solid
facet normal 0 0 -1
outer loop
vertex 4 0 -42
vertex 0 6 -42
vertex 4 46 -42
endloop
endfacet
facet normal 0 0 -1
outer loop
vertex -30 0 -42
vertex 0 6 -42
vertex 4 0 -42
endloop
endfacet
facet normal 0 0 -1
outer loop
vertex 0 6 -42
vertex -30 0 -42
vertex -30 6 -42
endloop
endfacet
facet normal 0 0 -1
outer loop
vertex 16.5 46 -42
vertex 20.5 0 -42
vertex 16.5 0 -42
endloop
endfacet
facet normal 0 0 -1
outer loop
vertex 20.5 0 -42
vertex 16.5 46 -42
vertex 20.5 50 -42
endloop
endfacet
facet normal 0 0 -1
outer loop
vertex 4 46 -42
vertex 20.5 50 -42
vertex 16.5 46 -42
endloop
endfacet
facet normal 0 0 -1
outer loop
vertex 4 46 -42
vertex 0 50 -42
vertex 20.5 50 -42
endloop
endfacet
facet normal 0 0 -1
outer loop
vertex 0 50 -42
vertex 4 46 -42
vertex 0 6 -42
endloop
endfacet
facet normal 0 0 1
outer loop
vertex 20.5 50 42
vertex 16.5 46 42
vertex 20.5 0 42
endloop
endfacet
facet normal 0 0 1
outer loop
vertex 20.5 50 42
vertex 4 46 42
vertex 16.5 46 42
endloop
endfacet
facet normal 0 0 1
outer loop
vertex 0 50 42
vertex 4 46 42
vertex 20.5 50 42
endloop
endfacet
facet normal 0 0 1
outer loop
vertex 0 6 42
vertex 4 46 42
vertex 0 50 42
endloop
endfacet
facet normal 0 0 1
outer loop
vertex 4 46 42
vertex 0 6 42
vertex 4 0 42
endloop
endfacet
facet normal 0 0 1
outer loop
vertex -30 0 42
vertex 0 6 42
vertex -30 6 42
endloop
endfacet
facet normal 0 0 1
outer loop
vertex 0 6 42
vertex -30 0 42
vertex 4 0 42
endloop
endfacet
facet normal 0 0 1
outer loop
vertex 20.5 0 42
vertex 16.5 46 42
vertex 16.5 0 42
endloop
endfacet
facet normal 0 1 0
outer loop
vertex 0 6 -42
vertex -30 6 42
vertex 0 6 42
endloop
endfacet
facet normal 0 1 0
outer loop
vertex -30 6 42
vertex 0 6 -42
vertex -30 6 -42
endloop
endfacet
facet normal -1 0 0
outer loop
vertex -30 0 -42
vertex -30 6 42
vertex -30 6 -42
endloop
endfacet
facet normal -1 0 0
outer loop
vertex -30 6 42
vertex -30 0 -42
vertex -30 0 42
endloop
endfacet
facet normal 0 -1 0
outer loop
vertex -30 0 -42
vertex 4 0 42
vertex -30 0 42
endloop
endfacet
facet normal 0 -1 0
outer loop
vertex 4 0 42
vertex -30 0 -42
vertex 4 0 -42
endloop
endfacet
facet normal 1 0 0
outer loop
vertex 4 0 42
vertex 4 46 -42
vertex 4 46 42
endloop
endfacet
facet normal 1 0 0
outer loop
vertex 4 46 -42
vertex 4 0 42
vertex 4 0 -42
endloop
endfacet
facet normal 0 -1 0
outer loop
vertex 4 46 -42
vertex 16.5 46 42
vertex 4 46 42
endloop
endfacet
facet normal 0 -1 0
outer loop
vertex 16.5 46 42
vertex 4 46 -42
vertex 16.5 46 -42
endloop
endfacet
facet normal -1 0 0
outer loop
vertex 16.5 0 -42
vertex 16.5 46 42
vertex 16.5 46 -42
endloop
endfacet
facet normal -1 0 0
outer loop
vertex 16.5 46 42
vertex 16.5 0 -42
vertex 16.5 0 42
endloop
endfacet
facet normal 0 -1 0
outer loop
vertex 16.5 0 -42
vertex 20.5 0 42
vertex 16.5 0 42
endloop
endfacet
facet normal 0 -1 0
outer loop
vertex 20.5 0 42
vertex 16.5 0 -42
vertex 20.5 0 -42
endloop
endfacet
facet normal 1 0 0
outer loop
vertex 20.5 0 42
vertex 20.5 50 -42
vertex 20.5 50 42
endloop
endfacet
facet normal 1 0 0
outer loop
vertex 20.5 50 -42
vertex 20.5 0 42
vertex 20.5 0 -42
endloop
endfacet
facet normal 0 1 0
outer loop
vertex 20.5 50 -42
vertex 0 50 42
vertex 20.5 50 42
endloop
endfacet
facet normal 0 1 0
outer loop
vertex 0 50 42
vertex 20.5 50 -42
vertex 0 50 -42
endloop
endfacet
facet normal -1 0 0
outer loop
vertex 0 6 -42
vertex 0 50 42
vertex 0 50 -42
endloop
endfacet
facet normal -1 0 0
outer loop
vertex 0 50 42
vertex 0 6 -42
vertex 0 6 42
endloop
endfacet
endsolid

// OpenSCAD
// Dimensions (mm)
wall_thickness = 12;
extrusion_length = 84;
inner_leg_y_start = 0;
inner_leg_y_end = 4;
outer_leg_y_start = 16.5;
outer_leg_y_end = 20.5;
leg_z_start = 0;
leg_z_end = 50;
bridge_z_start = 46;
bridge_z_end = 50;
wall_gap = 12.5;
ledge_thickness = 6;
ledge_y_start = 0;
ledge_y_end = -30;
tube_hole_diameter = 6.4;
tube_spacing = 9;
tube_y_pos = -15;
num_tubes = 8;

// Resolution for curved shapes
$fn = 64;

// The part is defined in the YZ plane and extruded along X.
// To ensure the part rests on z=0 and builds upward, we define the profile
// with Z from 0 to 50. The linear_extrude creates the X dimension.
// We use a difference operation to cut the holes.

difference() {
    // Main body
    linear_extrude(height = extrusion_length, center = true, convexity = 10)
    union() {
        // Inner leg: y=0 to 4, z=0 to 50
        translate([inner_leg_y_start, leg_z_start])
            square([inner_leg_y_end - inner_leg_y_start, leg_z_end - leg_z_start]);
        
        // Outer leg: y=16.5 to 20.5, z=0 to 50
        translate([outer_leg_y_start, leg_z_start])
            square([outer_leg_y_end - outer_leg_y_start, leg_z_end - leg_z_start]);
        
        // Bridge: connects inner and outer legs at top
        // y=0 to 20.5, z=46 to 50
        translate([inner_leg_y_start, bridge_z_start])
            square([outer_leg_y_end - inner_leg_y_start, bridge_z_end - bridge_z_start]);
        
        // Ledge: from foot of inner leg (y=0, z=0) reaching toward -Y
        // y=-30 to 0, z=0 to 6
        translate([ledge_y_end, leg_z_start])
            square([inner_leg_y_start - ledge_y_end, ledge_thickness]);
    }

    // Tube holes: 8 vertical through-holes along X, centered, at y = -15
    // These holes go through the ledge (z=0 to 6)
    // We extend the cylinder slightly past the ledge thickness to ensure clean cuts
    for (i = [0 : num_tubes - 1]) {
        x_pos = (i - (num_tubes - 1) / 2) * tube_spacing;
        translate([x_pos, tube_y_pos, 0])
            cylinder(h = ledge_thickness + 1, r = tube_hole_diameter / 2, center = false);
    }
}
